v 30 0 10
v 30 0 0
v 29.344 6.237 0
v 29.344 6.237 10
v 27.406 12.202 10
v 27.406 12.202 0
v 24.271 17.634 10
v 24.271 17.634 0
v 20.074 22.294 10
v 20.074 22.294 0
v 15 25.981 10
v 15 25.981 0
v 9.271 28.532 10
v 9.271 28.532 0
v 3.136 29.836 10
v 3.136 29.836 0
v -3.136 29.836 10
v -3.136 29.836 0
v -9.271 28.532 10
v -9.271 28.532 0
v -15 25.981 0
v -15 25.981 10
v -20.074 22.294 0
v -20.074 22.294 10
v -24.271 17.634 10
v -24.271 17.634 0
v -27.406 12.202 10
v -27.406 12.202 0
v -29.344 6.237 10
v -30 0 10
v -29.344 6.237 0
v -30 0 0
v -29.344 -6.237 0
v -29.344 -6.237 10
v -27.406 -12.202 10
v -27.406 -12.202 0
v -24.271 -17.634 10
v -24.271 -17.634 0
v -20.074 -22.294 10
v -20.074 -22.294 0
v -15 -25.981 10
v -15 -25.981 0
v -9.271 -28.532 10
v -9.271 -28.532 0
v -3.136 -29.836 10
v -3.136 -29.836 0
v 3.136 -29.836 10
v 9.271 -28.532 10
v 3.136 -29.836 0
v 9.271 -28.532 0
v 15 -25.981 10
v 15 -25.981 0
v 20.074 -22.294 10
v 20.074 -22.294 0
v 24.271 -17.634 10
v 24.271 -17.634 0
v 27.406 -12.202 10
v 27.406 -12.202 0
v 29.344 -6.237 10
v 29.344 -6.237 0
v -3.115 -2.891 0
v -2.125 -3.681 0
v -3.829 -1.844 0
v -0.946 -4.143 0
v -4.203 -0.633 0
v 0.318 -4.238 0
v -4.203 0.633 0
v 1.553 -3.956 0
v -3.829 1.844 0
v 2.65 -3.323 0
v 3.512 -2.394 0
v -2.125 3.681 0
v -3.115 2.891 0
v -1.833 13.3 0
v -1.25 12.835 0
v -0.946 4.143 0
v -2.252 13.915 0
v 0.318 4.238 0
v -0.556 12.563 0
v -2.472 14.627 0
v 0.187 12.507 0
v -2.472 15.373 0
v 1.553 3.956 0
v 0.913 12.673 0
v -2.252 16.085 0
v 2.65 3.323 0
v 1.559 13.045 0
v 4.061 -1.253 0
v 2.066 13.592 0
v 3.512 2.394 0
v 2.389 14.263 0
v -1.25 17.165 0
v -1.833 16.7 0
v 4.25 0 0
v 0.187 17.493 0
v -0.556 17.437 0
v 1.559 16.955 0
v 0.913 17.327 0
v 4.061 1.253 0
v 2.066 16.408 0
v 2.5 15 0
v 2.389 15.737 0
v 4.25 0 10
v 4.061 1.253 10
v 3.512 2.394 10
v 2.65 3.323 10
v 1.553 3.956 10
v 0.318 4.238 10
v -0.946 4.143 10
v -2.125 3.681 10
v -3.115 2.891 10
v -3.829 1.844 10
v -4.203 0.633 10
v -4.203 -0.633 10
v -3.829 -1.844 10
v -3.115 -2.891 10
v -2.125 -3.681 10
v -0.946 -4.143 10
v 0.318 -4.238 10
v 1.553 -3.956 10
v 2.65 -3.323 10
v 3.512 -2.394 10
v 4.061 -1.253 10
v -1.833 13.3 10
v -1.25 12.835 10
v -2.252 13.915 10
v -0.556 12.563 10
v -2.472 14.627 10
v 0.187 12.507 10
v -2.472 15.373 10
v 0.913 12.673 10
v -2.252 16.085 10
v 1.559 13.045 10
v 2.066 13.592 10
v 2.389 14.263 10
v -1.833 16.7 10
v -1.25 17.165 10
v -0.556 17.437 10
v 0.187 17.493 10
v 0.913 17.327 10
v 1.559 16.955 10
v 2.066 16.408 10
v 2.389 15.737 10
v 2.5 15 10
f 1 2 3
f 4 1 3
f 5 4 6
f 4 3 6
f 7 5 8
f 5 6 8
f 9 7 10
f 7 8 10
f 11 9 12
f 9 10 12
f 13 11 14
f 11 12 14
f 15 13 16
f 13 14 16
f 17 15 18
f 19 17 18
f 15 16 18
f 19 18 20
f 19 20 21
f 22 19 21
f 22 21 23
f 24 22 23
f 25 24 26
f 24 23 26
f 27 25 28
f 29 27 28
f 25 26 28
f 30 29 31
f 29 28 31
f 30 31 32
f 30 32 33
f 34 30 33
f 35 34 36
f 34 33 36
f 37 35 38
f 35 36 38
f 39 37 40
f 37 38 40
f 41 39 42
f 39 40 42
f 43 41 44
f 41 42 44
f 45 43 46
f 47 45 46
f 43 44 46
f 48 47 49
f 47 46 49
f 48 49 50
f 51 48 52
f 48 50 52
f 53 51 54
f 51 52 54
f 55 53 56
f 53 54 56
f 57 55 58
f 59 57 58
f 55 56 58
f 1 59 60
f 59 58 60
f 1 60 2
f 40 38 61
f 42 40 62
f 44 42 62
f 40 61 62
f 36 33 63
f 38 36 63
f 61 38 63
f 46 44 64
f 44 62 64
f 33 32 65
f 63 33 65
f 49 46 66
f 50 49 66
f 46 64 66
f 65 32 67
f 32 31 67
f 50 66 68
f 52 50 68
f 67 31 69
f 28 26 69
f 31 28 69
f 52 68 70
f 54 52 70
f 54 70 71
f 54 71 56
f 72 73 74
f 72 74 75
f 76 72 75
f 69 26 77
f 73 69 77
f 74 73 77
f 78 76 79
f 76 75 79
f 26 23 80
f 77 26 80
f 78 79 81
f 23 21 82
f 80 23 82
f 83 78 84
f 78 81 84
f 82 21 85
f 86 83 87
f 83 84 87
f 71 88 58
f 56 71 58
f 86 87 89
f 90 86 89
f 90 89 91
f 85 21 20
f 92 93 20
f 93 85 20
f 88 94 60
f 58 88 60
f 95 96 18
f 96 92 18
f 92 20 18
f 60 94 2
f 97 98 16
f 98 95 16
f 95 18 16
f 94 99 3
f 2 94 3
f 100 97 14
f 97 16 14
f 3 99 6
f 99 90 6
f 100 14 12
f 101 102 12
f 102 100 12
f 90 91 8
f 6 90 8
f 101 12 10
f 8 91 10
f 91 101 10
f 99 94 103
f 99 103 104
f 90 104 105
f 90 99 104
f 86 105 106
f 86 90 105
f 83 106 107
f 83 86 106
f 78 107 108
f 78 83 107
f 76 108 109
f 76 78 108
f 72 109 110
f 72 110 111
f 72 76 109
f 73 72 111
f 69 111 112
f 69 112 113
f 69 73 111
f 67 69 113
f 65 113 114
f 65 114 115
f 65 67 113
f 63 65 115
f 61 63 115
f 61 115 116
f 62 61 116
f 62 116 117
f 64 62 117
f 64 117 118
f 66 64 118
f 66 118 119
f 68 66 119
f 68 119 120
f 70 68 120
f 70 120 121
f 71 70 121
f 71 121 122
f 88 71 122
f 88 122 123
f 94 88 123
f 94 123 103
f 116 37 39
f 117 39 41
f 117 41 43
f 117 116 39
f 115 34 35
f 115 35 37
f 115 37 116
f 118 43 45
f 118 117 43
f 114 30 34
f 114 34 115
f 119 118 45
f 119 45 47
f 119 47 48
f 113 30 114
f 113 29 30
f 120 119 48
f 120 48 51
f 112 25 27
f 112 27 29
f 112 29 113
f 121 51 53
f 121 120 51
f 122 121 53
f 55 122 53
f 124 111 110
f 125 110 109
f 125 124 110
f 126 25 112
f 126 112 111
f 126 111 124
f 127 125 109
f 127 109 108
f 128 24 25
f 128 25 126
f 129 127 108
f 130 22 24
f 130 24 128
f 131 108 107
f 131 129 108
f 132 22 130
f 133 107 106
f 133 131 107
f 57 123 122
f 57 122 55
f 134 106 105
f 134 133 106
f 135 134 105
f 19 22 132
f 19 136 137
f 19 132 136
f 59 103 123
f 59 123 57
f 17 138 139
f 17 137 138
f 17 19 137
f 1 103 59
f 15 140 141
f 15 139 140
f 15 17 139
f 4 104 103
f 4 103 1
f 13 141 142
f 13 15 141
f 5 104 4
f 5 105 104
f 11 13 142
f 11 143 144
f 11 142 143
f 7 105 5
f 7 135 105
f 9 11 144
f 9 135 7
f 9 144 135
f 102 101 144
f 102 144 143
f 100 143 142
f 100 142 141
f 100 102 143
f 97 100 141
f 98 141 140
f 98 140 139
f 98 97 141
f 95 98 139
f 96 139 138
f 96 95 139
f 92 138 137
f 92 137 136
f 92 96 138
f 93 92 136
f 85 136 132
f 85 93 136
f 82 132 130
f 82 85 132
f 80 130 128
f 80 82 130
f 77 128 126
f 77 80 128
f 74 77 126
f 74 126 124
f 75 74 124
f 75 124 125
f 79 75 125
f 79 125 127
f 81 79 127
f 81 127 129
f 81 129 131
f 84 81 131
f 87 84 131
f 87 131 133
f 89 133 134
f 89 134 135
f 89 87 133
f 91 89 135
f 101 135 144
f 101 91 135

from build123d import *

# Parameters (mm, degrees)
SKETCH1_R               = 30
BOSS_EXTRUDE1_DEPTH     = 10
SKETCH2_R               = 2.5
CUT_EXTRUDE1_DEPTH      = 10
CUT_EXTRUDE4_DEPTH      = 10
CUT_EXTRUDE4_DEPTH_BACK = 10
SKETCH4_R               = 4.25


with BuildPart() as part:
    # Sketch1 → Boss-Extrude1 (new body)
    with BuildSketch(Plane.XY):
        Circle(SKETCH1_R)
    extrude(amount=BOSS_EXTRUDE1_DEPTH)

    # Sketch2 → Cut-Extrude1 (cut)
    with BuildSketch(Plane.XY):
        with Locations((0, 15)):
            Circle(SKETCH2_R)
    extrude(amount=CUT_EXTRUDE1_DEPTH, mode=Mode.SUBTRACT)

    # Sketch4 → Cut-Extrude4 (cut, two sides: drawn at the far end of the back side and taken through both)
    with BuildSketch(Plane.XY.offset(-CUT_EXTRUDE4_DEPTH_BACK)):
        Circle(SKETCH4_R)
    extrude(amount=CUT_EXTRUDE4_DEPTH + CUT_EXTRUDE4_DEPTH_BACK, mode=Mode.SUBTRACT)


solid = part.part
